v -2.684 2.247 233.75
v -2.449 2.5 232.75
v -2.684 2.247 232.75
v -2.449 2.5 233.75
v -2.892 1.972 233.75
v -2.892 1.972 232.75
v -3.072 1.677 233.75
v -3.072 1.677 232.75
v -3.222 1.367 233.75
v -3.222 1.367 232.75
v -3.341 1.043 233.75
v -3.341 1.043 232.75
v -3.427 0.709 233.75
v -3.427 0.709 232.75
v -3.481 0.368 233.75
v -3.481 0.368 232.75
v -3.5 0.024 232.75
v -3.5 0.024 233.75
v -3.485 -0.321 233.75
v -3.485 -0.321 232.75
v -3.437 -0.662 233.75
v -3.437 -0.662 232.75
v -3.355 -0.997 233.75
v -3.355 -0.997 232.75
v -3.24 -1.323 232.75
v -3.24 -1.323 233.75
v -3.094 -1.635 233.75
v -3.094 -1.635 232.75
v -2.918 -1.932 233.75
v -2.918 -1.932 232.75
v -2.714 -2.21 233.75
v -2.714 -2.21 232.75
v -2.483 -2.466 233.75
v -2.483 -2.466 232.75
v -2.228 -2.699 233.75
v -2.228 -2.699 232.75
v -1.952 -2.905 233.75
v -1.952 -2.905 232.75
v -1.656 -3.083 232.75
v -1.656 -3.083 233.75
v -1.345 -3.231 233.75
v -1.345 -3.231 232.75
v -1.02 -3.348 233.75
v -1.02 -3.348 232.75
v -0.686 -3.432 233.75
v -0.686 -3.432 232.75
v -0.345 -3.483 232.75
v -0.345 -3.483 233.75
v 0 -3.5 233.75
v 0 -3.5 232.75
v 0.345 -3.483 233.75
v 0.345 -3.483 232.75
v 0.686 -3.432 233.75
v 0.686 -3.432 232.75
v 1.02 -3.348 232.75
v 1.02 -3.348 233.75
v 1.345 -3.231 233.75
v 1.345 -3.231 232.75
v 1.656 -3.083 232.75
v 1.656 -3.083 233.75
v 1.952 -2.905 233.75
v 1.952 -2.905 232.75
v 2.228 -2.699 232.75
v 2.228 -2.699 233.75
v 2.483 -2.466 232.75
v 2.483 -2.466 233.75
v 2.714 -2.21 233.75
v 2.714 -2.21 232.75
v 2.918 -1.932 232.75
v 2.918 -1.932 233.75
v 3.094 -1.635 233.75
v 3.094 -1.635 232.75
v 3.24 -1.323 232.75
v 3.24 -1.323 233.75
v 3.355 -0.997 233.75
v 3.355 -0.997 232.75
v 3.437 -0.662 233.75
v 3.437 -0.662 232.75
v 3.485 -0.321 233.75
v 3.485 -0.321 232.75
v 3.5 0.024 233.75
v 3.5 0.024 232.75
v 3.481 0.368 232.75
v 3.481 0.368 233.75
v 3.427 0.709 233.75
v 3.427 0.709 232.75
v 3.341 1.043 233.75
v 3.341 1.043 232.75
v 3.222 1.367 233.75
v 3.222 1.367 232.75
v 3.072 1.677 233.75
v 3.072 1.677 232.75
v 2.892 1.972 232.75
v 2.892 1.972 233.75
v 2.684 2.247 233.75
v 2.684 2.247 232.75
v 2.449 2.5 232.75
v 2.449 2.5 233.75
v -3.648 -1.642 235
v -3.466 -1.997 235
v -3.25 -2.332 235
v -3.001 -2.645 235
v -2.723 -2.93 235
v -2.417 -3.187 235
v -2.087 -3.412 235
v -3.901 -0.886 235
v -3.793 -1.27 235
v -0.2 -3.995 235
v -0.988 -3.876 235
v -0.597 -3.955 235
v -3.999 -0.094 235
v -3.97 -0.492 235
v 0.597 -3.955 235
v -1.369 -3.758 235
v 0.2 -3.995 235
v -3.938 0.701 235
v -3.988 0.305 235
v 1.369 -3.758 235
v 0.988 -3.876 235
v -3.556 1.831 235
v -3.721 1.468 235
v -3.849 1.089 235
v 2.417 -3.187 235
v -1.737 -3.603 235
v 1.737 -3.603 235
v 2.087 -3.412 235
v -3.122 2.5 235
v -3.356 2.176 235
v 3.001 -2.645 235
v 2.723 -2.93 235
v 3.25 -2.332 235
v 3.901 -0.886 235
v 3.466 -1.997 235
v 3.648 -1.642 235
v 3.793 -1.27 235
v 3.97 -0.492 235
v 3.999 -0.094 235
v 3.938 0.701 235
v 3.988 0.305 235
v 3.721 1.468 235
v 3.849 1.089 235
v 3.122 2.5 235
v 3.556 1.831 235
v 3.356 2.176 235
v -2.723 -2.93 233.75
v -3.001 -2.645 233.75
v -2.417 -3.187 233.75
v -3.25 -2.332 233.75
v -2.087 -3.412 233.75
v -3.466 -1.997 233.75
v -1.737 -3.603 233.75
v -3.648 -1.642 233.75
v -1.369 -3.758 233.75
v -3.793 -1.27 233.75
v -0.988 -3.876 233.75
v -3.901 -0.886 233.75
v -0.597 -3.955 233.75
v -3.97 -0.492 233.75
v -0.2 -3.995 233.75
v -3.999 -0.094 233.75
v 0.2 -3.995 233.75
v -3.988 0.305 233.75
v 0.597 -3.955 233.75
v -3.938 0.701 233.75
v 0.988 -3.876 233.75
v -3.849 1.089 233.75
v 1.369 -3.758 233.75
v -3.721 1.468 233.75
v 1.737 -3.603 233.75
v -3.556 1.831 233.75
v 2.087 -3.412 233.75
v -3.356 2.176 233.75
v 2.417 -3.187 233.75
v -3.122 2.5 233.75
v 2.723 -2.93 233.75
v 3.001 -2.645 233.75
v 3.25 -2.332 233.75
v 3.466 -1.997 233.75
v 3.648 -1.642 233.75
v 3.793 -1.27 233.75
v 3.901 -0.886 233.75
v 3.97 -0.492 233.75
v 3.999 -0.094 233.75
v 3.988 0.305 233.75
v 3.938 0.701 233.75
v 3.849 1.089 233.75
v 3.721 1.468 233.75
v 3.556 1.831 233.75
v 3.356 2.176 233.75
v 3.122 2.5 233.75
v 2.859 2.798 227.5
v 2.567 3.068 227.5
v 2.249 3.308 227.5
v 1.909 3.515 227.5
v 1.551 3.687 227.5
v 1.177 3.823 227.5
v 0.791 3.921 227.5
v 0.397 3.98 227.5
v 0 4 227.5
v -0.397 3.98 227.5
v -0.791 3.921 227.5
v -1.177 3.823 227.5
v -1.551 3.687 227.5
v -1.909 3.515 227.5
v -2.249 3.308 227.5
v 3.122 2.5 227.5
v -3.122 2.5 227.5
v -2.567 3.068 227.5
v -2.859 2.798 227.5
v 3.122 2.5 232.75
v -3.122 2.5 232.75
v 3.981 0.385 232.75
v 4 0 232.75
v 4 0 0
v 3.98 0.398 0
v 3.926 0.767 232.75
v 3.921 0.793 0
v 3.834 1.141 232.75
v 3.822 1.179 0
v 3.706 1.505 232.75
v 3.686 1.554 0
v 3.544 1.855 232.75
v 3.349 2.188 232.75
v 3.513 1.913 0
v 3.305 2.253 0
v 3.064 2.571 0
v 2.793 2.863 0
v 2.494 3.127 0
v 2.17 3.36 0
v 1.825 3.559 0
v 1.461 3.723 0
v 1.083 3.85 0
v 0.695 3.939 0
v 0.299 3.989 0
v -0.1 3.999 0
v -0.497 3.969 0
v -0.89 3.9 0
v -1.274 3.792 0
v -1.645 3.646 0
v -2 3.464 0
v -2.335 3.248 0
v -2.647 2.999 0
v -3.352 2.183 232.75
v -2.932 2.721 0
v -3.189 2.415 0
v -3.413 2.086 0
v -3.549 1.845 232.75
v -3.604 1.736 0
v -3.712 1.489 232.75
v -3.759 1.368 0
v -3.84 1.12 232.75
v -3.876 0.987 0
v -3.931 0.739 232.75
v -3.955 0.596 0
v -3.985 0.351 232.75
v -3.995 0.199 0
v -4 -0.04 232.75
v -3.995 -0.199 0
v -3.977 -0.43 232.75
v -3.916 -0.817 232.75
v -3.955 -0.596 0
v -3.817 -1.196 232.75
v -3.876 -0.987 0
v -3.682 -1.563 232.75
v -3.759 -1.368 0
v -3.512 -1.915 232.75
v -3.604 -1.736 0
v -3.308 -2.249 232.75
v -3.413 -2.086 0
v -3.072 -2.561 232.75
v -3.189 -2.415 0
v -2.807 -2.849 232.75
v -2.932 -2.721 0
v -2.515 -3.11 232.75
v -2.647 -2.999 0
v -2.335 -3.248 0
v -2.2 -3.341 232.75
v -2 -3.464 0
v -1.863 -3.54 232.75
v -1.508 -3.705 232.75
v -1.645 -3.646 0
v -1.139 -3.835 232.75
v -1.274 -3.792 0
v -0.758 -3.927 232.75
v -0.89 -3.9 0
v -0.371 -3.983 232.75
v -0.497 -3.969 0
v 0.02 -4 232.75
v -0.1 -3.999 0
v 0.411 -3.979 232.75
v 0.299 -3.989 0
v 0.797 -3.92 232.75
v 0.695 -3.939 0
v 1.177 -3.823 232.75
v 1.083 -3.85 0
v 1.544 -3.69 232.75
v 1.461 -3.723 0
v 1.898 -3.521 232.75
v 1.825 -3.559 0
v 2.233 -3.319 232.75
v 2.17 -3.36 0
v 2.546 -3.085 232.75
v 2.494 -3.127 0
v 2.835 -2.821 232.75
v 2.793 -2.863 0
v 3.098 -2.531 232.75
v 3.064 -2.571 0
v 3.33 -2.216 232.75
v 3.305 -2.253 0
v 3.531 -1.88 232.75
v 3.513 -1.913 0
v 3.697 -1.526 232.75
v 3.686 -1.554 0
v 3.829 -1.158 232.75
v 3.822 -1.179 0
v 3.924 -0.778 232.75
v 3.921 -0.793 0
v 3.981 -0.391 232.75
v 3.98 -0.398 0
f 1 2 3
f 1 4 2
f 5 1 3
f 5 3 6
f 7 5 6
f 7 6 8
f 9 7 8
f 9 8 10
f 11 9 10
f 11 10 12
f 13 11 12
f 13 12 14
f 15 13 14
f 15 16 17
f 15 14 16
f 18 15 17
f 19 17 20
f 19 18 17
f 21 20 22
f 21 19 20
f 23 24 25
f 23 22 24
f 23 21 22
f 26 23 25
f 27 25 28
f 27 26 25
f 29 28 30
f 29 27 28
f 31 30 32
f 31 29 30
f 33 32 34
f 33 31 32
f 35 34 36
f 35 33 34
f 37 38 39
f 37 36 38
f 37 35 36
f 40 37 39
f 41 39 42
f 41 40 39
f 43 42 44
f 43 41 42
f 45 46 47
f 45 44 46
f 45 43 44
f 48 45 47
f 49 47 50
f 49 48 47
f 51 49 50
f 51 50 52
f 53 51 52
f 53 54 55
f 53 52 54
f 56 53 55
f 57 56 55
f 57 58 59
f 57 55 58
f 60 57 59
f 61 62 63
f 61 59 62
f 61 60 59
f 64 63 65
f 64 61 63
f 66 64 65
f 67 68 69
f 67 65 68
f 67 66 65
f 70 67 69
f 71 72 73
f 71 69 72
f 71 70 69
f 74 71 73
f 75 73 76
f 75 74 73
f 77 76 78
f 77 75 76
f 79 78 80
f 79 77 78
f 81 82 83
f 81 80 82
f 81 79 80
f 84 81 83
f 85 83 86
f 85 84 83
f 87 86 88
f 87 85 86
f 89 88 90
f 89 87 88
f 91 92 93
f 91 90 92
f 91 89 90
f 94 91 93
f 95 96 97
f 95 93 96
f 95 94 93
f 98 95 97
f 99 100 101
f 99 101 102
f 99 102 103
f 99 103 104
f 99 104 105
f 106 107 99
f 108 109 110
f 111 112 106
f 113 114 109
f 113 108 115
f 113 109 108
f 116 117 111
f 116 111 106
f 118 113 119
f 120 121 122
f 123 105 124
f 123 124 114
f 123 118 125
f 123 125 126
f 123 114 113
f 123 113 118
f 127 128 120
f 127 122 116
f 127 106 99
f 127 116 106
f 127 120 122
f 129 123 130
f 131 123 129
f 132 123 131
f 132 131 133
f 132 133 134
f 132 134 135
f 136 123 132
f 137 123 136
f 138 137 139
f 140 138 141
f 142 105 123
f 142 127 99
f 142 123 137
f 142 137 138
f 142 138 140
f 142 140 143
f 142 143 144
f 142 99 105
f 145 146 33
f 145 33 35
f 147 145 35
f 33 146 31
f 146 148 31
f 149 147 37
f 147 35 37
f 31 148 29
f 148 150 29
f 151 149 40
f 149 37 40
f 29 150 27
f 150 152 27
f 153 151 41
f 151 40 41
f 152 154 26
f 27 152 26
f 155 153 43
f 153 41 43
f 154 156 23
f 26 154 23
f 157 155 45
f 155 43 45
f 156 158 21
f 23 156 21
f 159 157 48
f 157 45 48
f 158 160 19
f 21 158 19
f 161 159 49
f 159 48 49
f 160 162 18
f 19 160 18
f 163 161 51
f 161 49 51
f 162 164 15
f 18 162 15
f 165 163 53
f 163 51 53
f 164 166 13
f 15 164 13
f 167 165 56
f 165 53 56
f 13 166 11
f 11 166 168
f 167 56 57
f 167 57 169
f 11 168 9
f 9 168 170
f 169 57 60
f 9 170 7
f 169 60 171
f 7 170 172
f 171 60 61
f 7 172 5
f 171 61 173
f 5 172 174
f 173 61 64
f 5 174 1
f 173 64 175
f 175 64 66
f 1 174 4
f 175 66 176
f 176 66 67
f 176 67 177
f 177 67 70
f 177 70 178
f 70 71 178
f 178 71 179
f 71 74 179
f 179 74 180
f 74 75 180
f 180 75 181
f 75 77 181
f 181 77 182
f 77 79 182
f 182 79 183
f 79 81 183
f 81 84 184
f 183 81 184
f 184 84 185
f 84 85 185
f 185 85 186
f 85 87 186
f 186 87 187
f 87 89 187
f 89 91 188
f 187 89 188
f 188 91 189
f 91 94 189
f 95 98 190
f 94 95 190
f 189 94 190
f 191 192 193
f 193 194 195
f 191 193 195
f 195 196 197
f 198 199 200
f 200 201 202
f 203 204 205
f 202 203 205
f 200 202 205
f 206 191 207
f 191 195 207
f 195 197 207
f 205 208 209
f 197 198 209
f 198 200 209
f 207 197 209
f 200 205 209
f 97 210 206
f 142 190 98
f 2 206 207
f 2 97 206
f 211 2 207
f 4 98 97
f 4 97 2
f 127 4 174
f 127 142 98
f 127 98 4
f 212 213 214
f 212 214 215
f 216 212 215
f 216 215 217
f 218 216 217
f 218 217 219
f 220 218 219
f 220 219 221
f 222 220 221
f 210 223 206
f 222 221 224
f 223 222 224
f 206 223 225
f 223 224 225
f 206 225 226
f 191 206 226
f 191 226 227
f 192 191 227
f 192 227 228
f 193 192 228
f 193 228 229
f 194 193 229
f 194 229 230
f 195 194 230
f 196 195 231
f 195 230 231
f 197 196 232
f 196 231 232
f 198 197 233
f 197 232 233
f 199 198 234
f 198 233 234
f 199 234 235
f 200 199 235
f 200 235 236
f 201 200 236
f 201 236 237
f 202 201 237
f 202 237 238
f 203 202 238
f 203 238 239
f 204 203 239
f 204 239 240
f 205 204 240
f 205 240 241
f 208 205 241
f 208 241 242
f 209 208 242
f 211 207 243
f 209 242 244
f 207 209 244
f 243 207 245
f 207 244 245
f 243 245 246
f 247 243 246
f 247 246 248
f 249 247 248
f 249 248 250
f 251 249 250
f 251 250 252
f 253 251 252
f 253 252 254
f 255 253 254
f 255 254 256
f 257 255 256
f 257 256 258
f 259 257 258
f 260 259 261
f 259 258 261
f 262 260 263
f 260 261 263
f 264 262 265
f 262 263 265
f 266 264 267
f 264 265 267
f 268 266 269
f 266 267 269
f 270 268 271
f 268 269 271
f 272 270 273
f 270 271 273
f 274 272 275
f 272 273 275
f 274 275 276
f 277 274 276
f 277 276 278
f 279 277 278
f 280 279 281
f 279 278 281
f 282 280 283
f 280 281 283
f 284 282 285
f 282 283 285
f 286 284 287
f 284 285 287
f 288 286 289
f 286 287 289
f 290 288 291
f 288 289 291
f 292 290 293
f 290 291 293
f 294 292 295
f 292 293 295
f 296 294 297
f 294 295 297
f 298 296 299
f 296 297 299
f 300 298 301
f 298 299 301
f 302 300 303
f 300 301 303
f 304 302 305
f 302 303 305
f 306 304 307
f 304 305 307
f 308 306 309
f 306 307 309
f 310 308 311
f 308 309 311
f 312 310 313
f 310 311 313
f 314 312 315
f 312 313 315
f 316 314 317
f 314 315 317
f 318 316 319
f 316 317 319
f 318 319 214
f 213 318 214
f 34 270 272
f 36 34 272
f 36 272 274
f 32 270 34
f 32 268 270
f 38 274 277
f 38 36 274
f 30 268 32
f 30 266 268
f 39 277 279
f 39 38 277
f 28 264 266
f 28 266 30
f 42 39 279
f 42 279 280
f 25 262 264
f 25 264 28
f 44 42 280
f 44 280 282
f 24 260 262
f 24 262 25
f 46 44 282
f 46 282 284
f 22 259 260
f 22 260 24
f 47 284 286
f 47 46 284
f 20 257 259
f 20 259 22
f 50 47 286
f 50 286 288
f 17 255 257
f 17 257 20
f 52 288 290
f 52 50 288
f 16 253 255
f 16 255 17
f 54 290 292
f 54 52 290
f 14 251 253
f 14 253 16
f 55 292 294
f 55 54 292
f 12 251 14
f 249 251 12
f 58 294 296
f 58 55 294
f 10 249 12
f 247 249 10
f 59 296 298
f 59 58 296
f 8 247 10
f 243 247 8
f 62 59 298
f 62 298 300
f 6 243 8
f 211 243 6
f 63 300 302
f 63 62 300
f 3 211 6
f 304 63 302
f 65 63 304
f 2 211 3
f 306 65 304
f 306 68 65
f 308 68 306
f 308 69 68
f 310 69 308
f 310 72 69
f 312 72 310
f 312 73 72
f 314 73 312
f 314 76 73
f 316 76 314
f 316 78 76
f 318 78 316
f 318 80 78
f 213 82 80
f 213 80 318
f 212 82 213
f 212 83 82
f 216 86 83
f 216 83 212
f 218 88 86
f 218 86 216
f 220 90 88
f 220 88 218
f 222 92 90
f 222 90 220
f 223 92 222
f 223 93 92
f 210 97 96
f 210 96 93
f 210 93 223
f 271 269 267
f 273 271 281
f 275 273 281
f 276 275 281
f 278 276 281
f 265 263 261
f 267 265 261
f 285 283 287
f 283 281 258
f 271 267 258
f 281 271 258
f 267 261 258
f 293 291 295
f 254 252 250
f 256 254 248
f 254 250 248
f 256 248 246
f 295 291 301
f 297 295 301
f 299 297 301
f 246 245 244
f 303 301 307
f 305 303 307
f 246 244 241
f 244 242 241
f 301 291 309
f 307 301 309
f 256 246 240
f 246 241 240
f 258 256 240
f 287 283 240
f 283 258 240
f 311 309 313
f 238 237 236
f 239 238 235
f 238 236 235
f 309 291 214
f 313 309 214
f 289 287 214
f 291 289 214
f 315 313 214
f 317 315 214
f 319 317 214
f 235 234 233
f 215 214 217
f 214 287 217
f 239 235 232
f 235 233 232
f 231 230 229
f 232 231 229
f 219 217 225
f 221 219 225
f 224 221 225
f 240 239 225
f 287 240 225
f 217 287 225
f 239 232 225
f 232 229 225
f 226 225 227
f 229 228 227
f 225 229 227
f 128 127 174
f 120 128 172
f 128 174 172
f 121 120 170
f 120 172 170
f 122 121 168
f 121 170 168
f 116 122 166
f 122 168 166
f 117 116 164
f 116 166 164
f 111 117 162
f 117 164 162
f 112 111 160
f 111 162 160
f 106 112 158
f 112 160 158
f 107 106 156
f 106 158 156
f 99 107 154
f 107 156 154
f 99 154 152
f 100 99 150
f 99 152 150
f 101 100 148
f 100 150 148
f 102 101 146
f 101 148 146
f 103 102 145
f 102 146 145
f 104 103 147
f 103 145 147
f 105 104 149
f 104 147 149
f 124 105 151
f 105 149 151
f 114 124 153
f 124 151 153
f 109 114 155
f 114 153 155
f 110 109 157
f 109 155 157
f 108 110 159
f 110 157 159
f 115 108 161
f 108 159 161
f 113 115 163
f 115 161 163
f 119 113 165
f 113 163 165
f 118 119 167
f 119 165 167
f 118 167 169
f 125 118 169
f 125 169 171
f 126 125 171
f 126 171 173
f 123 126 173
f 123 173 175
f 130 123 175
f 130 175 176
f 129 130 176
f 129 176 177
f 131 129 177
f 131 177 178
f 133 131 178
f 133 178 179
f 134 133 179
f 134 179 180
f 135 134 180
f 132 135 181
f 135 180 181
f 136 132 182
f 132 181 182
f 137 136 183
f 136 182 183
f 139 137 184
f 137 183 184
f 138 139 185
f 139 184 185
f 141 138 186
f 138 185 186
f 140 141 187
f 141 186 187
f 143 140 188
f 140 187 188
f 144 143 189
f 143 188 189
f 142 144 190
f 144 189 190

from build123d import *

# Parameters (mm, degrees)
SKETCH1_R           = 4
BOSS_EXTRUDE1_DEPTH = 235
CUT_EXTRUDE1_DEPTH  = 7.5
SKETCH3_R           = 4
SKETCH3_R_2         = 3.5
CUT_EXTRUDE2_DEPTH  = 1


with BuildPart() as part:
    # Sketch1 → Boss-Extrude1 (new body)
    with BuildSketch(Plane.XY):
        Circle(SKETCH1_R)
    extrude(amount=BOSS_EXTRUDE1_DEPTH)

    # Sketch2 → Cut-Extrude1 (cut)
    with BuildSketch(Plane.XY.offset(235)):
        with BuildLine():
            Line((3.122498999, 2.5), (-3.122498999, 2.5))
            ThreePointArc((-3.122498999, 2.5), (0, 4), (3.122498999, 2.5))
        make_face()
    extrude(amount=-CUT_EXTRUDE1_DEPTH, mode=Mode.SUBTRACT)

    # Sketch3 → Cut-Extrude2 (cut)
    with BuildSketch(Plane.XY.offset(233.75)):
        Circle(SKETCH3_R)
        Circle(SKETCH3_R_2, mode=Mode.SUBTRACT)
    extrude(amount=-CUT_EXTRUDE2_DEPTH, mode=Mode.SUBTRACT)


solid = part.part
